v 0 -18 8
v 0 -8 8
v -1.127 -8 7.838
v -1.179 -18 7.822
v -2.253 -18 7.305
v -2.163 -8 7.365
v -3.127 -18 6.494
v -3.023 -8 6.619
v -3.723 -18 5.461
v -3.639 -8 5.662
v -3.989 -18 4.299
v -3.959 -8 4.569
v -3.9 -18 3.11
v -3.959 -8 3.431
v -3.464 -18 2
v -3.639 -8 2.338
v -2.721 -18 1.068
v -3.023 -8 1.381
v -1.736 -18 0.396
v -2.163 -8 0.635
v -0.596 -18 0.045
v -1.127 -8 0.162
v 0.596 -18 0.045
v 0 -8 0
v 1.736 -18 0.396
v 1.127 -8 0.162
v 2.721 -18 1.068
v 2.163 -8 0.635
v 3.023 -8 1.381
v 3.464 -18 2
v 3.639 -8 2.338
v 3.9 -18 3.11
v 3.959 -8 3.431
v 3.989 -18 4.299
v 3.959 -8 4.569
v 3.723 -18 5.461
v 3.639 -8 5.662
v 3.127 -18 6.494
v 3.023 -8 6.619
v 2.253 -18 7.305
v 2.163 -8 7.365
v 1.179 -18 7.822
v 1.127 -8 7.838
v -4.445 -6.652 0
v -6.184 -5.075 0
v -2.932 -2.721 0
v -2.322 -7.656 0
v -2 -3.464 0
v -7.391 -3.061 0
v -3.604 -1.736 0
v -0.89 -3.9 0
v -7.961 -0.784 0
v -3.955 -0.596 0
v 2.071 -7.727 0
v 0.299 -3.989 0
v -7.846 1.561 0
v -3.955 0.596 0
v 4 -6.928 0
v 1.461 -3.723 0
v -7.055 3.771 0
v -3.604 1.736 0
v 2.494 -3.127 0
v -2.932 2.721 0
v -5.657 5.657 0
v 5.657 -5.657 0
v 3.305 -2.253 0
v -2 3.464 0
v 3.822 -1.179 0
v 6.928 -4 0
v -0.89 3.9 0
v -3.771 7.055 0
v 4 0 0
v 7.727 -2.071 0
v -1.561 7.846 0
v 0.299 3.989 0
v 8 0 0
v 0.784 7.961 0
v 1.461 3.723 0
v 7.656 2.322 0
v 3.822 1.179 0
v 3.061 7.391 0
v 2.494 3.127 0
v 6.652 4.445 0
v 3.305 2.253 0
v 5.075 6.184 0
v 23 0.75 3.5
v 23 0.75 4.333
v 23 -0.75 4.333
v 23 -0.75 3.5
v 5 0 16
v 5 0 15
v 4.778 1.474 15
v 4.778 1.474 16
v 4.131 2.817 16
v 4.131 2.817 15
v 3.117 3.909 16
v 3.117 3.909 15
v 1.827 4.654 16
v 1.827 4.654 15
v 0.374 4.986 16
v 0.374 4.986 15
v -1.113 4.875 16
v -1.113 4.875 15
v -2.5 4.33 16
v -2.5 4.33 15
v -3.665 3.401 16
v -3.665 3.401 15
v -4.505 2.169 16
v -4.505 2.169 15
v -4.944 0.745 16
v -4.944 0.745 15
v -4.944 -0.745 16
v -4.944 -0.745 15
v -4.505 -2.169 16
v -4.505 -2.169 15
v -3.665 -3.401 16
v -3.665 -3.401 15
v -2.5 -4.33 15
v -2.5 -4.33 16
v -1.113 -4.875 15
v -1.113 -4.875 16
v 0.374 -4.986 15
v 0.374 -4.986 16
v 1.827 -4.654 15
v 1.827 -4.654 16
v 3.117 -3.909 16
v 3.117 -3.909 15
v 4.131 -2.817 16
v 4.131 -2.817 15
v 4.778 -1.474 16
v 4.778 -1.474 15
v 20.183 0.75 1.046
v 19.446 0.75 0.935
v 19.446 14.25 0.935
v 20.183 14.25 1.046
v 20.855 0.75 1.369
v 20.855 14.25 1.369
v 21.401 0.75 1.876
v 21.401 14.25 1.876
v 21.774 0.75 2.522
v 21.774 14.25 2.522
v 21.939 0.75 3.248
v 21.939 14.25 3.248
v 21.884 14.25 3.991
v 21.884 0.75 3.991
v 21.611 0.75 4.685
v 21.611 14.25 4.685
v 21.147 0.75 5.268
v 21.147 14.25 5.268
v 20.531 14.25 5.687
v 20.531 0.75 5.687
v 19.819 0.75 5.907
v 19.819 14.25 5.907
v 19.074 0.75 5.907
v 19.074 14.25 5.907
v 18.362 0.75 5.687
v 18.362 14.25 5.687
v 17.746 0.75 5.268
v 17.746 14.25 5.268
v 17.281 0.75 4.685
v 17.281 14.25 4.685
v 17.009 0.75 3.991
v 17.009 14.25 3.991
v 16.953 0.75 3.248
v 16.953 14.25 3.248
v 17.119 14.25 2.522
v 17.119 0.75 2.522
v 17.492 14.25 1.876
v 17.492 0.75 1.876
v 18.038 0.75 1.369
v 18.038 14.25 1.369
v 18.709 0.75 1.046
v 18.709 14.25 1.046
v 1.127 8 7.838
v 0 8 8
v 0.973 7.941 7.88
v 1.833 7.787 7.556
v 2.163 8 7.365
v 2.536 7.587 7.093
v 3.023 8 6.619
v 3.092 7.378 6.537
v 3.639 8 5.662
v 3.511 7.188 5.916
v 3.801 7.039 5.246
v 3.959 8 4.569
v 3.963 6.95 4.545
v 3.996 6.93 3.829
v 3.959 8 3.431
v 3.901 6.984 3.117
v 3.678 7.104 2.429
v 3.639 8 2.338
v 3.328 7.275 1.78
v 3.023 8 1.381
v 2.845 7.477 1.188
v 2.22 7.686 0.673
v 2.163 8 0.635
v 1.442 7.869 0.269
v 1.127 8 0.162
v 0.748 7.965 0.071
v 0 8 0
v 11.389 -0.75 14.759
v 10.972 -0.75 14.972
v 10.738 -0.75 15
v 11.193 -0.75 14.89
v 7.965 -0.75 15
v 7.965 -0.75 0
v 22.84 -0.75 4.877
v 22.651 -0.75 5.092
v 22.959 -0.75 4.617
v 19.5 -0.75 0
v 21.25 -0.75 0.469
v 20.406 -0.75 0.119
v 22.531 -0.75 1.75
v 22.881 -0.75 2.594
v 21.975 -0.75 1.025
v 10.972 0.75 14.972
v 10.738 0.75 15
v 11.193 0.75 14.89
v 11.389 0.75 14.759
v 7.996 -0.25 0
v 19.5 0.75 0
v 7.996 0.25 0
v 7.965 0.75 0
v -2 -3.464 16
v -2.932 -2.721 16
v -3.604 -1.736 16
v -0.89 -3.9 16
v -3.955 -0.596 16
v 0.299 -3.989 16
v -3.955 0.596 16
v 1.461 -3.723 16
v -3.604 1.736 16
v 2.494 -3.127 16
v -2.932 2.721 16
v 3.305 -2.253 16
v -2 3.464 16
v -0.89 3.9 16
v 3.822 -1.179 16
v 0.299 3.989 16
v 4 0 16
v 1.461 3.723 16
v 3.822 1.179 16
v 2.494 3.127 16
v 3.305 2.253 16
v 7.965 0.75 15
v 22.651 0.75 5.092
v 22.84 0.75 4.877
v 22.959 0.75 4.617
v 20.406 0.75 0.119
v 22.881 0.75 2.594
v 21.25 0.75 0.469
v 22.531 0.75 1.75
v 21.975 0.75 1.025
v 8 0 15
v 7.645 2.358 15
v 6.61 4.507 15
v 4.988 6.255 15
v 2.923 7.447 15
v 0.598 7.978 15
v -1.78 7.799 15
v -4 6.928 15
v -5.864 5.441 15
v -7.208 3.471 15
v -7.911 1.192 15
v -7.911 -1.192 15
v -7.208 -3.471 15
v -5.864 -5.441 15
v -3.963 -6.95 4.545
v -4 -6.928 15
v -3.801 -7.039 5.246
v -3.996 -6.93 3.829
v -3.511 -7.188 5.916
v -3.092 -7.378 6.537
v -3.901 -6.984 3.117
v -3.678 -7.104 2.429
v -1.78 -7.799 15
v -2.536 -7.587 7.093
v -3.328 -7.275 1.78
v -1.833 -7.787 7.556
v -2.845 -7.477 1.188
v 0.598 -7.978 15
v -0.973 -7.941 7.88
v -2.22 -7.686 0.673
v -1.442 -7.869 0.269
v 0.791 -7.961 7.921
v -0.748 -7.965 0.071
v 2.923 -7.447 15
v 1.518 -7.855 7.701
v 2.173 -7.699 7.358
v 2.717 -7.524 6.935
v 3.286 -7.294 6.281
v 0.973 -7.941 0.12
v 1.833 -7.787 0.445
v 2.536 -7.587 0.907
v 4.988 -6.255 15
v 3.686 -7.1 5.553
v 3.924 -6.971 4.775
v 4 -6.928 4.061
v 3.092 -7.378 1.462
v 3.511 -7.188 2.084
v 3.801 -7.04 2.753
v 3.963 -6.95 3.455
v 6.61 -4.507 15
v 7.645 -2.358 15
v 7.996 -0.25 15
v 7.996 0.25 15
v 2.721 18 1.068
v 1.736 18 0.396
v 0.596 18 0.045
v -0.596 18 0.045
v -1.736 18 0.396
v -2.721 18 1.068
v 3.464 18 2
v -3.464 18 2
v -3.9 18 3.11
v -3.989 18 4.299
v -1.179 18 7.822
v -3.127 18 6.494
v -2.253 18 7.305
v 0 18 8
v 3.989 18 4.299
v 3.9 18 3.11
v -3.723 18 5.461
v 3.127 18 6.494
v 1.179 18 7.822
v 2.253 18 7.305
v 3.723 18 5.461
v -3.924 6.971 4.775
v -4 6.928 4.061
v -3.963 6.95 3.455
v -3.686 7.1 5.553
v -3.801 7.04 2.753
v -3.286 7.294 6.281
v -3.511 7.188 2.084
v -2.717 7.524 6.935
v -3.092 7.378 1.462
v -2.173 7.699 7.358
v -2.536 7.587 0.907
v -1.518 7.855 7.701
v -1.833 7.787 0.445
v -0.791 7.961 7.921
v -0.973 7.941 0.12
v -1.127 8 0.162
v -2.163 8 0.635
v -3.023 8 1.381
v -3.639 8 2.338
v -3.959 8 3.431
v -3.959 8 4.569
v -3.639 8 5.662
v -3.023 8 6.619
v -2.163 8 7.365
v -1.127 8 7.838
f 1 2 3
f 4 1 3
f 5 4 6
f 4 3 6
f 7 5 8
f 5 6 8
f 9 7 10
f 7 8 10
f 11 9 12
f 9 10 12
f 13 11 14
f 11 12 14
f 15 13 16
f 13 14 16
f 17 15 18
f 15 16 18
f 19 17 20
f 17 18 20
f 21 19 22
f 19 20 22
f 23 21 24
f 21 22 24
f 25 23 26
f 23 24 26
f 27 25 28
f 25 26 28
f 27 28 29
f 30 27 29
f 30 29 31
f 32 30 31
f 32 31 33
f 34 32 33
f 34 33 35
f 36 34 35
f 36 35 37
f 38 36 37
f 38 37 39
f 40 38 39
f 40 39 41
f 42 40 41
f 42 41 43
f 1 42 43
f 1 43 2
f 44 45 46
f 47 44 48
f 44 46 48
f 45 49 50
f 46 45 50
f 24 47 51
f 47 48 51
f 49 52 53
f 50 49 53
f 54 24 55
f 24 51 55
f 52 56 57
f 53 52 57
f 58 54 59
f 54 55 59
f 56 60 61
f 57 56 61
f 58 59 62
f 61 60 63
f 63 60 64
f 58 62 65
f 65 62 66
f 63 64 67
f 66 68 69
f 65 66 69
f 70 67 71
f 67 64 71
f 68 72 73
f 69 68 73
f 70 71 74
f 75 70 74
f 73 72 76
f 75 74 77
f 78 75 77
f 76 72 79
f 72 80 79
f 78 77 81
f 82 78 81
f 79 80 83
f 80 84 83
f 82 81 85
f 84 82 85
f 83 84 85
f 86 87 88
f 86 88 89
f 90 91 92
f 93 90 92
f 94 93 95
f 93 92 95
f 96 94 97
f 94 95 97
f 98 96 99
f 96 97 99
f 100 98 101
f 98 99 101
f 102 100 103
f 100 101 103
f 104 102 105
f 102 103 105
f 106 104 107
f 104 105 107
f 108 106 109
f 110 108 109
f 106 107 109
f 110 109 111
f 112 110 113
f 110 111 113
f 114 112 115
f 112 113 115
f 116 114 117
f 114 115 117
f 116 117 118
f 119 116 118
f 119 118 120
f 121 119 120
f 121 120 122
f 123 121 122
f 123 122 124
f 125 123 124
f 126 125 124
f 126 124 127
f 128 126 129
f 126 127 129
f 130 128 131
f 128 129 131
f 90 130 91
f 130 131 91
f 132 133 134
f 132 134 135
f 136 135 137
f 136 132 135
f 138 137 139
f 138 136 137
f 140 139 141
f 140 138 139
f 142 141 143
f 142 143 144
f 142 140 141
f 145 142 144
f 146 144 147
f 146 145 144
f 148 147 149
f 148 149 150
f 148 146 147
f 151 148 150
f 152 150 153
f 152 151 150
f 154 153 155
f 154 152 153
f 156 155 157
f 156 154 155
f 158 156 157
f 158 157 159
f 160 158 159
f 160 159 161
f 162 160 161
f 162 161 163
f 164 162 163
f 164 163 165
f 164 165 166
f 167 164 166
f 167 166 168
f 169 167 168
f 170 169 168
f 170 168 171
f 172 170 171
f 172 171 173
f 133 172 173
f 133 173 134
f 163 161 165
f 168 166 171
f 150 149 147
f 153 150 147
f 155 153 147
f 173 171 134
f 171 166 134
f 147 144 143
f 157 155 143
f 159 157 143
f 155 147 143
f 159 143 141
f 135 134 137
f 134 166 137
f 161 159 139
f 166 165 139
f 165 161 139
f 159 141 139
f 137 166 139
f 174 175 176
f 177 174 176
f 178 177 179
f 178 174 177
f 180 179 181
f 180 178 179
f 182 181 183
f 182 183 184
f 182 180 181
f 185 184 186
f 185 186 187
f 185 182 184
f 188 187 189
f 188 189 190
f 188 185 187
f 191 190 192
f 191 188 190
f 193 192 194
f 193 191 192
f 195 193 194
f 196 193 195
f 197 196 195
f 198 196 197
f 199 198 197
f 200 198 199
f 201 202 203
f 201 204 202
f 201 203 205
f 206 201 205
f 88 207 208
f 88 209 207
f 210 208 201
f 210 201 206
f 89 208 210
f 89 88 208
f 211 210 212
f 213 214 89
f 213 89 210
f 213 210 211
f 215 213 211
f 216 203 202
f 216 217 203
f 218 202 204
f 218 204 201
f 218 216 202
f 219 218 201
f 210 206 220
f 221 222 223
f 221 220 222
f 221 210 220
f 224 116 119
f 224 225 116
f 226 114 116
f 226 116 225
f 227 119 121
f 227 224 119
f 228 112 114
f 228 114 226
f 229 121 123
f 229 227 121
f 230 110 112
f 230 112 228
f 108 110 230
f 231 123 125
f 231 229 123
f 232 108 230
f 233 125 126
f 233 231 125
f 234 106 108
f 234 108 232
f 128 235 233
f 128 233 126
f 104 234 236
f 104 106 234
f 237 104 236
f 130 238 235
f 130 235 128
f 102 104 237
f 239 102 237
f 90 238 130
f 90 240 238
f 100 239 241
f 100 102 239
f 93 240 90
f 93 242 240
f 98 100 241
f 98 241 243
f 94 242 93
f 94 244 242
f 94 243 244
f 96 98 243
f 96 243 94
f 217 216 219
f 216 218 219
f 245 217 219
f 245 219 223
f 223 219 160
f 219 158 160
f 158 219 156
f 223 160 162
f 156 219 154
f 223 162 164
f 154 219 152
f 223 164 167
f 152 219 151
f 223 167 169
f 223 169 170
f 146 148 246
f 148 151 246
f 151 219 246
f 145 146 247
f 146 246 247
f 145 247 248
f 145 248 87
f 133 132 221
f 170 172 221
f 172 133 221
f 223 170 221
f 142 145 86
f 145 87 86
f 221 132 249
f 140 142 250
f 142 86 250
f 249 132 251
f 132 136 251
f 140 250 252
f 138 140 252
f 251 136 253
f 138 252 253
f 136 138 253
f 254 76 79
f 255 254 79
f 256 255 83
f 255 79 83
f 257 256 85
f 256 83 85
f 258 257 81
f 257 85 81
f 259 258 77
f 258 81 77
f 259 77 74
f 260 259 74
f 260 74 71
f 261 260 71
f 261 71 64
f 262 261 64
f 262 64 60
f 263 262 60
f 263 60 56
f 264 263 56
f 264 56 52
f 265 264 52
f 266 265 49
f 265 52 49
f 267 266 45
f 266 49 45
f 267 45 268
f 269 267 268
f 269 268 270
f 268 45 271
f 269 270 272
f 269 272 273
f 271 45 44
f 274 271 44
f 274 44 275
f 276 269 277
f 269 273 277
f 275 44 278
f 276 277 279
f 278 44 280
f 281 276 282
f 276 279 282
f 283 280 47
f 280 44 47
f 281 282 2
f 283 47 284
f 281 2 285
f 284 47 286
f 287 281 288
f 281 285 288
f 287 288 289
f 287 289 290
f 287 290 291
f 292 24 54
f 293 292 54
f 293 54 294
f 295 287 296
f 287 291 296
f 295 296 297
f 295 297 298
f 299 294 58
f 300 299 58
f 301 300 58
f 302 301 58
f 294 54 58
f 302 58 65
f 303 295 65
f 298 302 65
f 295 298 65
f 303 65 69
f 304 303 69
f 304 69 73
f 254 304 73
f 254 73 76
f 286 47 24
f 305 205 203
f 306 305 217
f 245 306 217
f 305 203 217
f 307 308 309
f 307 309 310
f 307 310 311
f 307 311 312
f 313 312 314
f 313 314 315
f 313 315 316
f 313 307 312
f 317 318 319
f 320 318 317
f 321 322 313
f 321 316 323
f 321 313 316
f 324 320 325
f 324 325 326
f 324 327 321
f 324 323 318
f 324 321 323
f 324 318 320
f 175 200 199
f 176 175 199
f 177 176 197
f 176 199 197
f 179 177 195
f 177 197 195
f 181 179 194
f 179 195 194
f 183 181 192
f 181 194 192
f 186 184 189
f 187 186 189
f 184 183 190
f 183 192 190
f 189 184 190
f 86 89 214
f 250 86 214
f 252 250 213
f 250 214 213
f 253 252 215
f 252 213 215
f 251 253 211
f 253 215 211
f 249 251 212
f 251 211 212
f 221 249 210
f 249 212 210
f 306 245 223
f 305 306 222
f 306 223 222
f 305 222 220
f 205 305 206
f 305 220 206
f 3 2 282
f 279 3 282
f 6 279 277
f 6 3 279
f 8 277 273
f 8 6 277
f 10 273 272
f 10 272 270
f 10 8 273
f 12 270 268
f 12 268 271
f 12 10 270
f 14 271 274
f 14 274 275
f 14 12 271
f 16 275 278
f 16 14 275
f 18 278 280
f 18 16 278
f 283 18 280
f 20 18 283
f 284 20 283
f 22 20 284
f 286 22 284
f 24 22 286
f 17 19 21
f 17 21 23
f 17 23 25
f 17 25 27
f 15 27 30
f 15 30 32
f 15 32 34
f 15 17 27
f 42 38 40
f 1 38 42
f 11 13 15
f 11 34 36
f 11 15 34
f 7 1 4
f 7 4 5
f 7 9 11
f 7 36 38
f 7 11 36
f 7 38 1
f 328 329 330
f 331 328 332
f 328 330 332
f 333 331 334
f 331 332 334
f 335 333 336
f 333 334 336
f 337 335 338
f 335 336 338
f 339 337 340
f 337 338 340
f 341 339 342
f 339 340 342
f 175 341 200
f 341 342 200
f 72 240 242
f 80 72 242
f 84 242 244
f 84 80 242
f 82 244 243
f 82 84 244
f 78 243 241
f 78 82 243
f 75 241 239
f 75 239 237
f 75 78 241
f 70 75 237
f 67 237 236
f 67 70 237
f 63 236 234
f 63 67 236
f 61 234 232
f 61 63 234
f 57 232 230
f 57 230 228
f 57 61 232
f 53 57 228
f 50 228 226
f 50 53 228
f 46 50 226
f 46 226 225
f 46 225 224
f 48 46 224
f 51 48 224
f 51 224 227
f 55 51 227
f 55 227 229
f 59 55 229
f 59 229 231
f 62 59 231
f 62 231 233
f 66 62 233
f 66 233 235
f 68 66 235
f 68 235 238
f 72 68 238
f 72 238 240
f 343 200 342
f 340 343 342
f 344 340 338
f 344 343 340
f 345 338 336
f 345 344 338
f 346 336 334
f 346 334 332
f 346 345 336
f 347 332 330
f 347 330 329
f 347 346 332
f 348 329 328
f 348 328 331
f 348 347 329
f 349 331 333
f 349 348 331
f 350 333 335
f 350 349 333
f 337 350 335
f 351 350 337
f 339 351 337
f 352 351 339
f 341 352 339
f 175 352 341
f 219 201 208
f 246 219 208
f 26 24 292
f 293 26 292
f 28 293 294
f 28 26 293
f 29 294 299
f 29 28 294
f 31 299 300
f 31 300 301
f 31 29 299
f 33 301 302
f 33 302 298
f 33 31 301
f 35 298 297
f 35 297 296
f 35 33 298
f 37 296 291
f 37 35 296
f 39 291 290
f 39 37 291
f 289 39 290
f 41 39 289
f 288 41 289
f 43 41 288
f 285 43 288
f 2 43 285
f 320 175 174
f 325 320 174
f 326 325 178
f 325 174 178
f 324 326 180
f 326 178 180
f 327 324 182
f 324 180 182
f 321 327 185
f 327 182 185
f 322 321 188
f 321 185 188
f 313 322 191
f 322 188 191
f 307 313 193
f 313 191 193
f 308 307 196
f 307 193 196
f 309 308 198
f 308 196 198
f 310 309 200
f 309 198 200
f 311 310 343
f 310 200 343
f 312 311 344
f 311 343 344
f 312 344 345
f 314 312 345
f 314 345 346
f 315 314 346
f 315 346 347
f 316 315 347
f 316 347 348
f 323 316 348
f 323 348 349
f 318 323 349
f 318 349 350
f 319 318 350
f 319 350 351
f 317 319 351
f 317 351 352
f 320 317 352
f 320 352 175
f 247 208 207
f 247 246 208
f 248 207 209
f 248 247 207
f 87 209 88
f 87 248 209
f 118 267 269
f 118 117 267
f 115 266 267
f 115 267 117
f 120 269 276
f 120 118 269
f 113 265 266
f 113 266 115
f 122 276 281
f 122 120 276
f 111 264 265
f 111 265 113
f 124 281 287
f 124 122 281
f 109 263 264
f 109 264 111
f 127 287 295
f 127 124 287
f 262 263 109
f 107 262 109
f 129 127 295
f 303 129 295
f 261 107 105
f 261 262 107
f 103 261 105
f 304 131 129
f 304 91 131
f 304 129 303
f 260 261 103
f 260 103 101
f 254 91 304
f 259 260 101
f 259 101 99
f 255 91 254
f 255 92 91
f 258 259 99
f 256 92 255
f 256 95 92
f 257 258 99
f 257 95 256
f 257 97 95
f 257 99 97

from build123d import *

# Parameters (mm, degrees)
SKETCH1_R                            = 8
BOSS_EXTRUDE1_DEPTH                  = 15
SKETCH2_R                            = 5
SKETCH2_R_2                          = 4
BOSS_EXTRUDE2_DEPTH                  = 1
CUT_EXTRUDE1_START                   = -15
SKETCH3_R                            = 4
CUT_EXTRUDE1_DEPTH                   = 15
SKETCH4_R                            = 4
BOSS_EXTRUDE3_DEPTH                  = 10
BOSS_EXTRUDE3_DIRECTION_2_REACH      = 26
BOSS_EXTRUDE3_DIRECTION_2_END_RADIUS = 8
SKETCH6_R                            = 4
BOSS_EXTRUDE4_DEPTH                  = 10
BOSS_EXTRUDE4_DIRECTION_2_REACH      = 33.559
BOSS_EXTRUDE4_DIRECTION_2_END_RADIUS = 8
SKETCH7_W                            = 15
SKETCH7_H                            = 1.5
BOSS_EXTRUDE5_DEPTH                  = 15
BOSS_EXTRUDE5_DIRECTION_2_REACH      = 30.914
BOSS_EXTRUDE5_DIRECTION_2_END_RADIUS = 8
CUT_EXTRUDE2_DEPTH                   = 15
CUT_EXTRUDE3_DEPTH                   = 15
FILLET1_R                            = 1
FILLET2_R                            = 1
SKETCH12_R                           = 2.5
BOSS_EXTRUDE6_DEPTH                  = 15


with BuildPart() as part:
    # Sketch1 → Boss-Extrude1 (new body)
    with BuildSketch(Plane.XY):
        Circle(SKETCH1_R)
    extrude(amount=BOSS_EXTRUDE1_DEPTH)

    # Sketch2 → Boss-Extrude2 (add)
    with BuildSketch(Plane.XY.offset(15)):
        Circle(SKETCH2_R)
        Circle(SKETCH2_R_2, mode=Mode.SUBTRACT)
    extrude(amount=BOSS_EXTRUDE2_DEPTH)

    # Sketch3 → Cut-Extrude1 (cut)
    with BuildSketch(Plane.XY.offset(15).offset(CUT_EXTRUDE1_START)):
        Circle(SKETCH3_R)
    extrude(amount=CUT_EXTRUDE1_DEPTH, mode=Mode.SUBTRACT)

    # Sketch6 → Boss-Extrude4 (add)
    with BuildSketch(Plane(origin=(0, -8, 0), x_dir=(-1, 0, 0), z_dir=(0, -1, 0))):
        with Locations(Location((0, -4, 0), (0, 0, 270))):
            Circle(SKETCH6_R)
    extrude(amount=BOSS_EXTRUDE4_DEPTH)

    # Boss-Extrude4 direction 2: up to this cylinder (the profile starts outside it)
    boss_extrude4_direction_2_end = Plane(origin=(0, 0, 4), z_dir=(0, 0, -1)) * Cylinder(BOSS_EXTRUDE4_DIRECTION_2_END_RADIUS, 84.118, mode=Mode.PRIVATE)
    # Sketch6 → Boss-Extrude4 direction 2 (add, up to the surface)
    with BuildSketch(Plane(origin=(0, -8, 0), x_dir=(-1, 0, 0), z_dir=(0, -1, 0)), mode=Mode.PRIVATE) as boss_extrude4_direction_2_sk1:
        with Locations(Location((0, -4, 0), (0, 0, 270))):
            Circle(SKETCH6_R)
    boss_extrude4_direction_2_tool1 = extrude(boss_extrude4_direction_2_sk1.sketch, amount=-BOSS_EXTRUDE4_DIRECTION_2_REACH, mode=Mode.PRIVATE) - boss_extrude4_direction_2_end
    add(boss_extrude4_direction_2_tool1.solids().sort_by_distance((0, -8, 4))[0])
    add(boss_extrude4_direction_2_tool1.solids().sort_by_distance((0, -8, 4))[1])


with BuildPart() as body_2:
    # Sketch4 → Boss-Extrude3 (new body)
    with BuildSketch(Plane(origin=(0, 8, 0), x_dir=(1, 0, 0), z_dir=(0, 1, 0))):
        with Locations(Location((0, -4, 0), (0, 0, 270))):
            Circle(SKETCH4_R)
    extrude(amount=BOSS_EXTRUDE3_DEPTH)

    # Boss-Extrude3 direction 2: up to this cylinder (the profile starts outside it)
    boss_extrude3_direction_2_end = Plane(origin=(0, 0, 4), z_dir=(0, 0, -1)) * Cylinder(BOSS_EXTRUDE3_DIRECTION_2_END_RADIUS, 69, mode=Mode.PRIVATE)
    # Sketch4 → Boss-Extrude3 direction 2 (add, up to the surface)
    with BuildSketch(Plane(origin=(0, 8, 0), x_dir=(1, 0, 0), z_dir=(0, 1, 0)), mode=Mode.PRIVATE) as boss_extrude3_direction_2_sk1:
        with Locations(Location((0, -4, 0), (0, 0, 270))):
            Circle(SKETCH4_R)
    boss_extrude3_direction_2_tool1 = extrude(boss_extrude3_direction_2_sk1.sketch, amount=-BOSS_EXTRUDE3_DIRECTION_2_REACH, mode=Mode.PRIVATE) - boss_extrude3_direction_2_end
    add(boss_extrude3_direction_2_tool1.solids().sort_by_distance((0, 8, 4))[0])
    add(boss_extrude3_direction_2_tool1.solids().sort_by_distance((0, 8, 4))[1])


with BuildPart() as body_3:
    # Sketch7 → Boss-Extrude5 (new body)
    with BuildSketch(Plane(origin=(8, 0, 0), x_dir=(0, 0, -1), z_dir=(1, 0, 0))):
        with Locations((-7.5, 0)):
            Rectangle(SKETCH7_W, SKETCH7_H)
    extrude(amount=BOSS_EXTRUDE5_DEPTH)

    # Boss-Extrude5 direction 2: up to this cylinder (the profile starts outside it)
    boss_extrude5_direction_2_end = Plane(origin=(0, 0, 7.5), z_dir=(0, 0, -1)) * Cylinder(BOSS_EXTRUDE5_DIRECTION_2_END_RADIUS, 78.828, mode=Mode.PRIVATE)
    # Sketch7 → Boss-Extrude5 direction 2 (add, up to the surface)
    with BuildSketch(Plane(origin=(8, 0, 0), x_dir=(0, 0, -1), z_dir=(1, 0, 0)), mode=Mode.PRIVATE) as boss_extrude5_direction_2_sk1:
        with Locations((-7.5, 0)):
            Rectangle(SKETCH7_W, SKETCH7_H)
    boss_extrude5_direction_2_tool1 = extrude(boss_extrude5_direction_2_sk1.sketch, amount=-BOSS_EXTRUDE5_DIRECTION_2_REACH, mode=Mode.PRIVATE) - boss_extrude5_direction_2_end
    add(boss_extrude5_direction_2_tool1.solids().sort_by_distance((8, 0, 7.5))[0])
    add(boss_extrude5_direction_2_tool1.solids().sort_by_distance((8, 0, 7.5))[1])

    # Sketch9 → Cut-Extrude2 (cut)
    with BuildSketch(Plane.XZ.offset(0.75)):
        with BuildLine():
            ThreePointArc((23, 3.5), (21.974873734, 1.025126266), (19.5, 0))
            Line((19.5, 0), (23, 0))
            Line((23, 0), (23, 3.5))
        make_face()
    extrude(amount=-CUT_EXTRUDE2_DEPTH, mode=Mode.SUBTRACT)

    # Sketch11 → Cut-Extrude3 (cut)
    with BuildSketch(Plane(origin=(0, -0.75, 0), x_dir=(-1, 0, 0), z_dir=(0, -1, 0))):
        Polygon((-23, -15), (-11.108053079, -15), (-23, -4.792841708), align=None)
    extrude(amount=-CUT_EXTRUDE3_DEPTH, mode=Mode.SUBTRACT)

    # Fillet1
    fillet1_edges = [body_3.edges().sort_by_distance(p)[0] for p in [
        (11.108053079, 0, 15),
    ]]
    fillet(fillet1_edges, radius=FILLET1_R)

    # Fillet2
    fillet2_edges = [body_3.edges().sort_by_distance(p)[0] for p in [
        (23, 0, 4.792841708),
    ]]
    fillet(fillet2_edges, radius=FILLET2_R)

    # Sketch12 → Boss-Extrude6 (add)
    with BuildSketch(Plane.XZ.offset(0.75)):
        with Locations(Location((19.446318933, 3.434994956, 0), (0, 0, 270))):
            Circle(SKETCH12_R)
    extrude(amount=-BOSS_EXTRUDE6_DEPTH)


solid = Compound([part.part, body_2.part, body_3.part])
